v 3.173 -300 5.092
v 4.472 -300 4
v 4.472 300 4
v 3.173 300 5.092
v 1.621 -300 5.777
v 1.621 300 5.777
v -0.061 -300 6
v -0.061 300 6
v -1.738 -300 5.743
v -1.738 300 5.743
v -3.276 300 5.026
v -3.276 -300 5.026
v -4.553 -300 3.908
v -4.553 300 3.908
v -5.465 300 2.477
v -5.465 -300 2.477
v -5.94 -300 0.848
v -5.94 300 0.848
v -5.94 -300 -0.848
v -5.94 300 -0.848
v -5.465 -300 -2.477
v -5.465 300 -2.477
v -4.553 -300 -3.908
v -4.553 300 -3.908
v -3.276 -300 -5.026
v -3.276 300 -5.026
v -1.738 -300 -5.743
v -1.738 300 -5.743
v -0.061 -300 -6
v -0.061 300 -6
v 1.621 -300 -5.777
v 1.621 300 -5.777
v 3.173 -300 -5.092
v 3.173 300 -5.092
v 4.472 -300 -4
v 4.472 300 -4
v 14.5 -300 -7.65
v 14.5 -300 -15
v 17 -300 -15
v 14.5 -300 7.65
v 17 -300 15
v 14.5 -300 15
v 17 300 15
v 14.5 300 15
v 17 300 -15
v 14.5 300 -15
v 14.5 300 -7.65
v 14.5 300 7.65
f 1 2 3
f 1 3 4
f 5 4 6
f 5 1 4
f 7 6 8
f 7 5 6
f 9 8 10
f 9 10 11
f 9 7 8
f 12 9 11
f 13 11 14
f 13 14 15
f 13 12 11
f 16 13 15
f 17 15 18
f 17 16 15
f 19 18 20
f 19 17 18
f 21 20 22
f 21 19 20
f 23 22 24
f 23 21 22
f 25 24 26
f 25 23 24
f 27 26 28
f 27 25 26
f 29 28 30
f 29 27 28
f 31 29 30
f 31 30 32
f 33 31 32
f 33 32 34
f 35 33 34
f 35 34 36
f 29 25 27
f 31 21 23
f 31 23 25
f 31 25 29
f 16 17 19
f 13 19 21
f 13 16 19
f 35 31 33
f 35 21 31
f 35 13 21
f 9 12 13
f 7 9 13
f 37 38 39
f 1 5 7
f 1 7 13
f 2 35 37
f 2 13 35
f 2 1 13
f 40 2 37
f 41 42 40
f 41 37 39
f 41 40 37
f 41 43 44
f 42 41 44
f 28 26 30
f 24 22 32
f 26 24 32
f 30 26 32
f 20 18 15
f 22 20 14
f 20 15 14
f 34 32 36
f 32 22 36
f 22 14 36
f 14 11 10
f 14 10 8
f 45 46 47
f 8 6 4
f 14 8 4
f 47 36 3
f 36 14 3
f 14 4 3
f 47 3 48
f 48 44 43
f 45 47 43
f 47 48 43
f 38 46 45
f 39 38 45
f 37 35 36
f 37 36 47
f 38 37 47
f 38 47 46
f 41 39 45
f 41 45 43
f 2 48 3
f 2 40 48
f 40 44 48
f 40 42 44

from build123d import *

# Parameters (mm, degrees)
F1_DEPTH      = 300
F1_DEPTH_BACK = 300


with BuildPart() as f1:
    # F0 (on Front) → F1 (new body, two sides)
    with BuildSketch(Plane.XZ) as f1_sk:
        with BuildLine():
            Line((14.5, 7.649844), (4.472136, 4))
            ThreePointArc((4.472136, 4), (-6, 0), (4.472136, -4))
            Line((4.472136, -4), (14.5, -7.649844))
            Line((14.5, -7.649844), (14.5, -15))
            Line((14.5, -15), (17, -15))
            Line((17, -15), (17, 15))
            Line((17, 15), (14.5, 15))
            Line((14.5, 15), (14.5, 7.649844))
        make_face()
    extrude(amount=F1_DEPTH)
    extrude(f1_sk.sketch, amount=-F1_DEPTH_BACK)


solid = f1.part
